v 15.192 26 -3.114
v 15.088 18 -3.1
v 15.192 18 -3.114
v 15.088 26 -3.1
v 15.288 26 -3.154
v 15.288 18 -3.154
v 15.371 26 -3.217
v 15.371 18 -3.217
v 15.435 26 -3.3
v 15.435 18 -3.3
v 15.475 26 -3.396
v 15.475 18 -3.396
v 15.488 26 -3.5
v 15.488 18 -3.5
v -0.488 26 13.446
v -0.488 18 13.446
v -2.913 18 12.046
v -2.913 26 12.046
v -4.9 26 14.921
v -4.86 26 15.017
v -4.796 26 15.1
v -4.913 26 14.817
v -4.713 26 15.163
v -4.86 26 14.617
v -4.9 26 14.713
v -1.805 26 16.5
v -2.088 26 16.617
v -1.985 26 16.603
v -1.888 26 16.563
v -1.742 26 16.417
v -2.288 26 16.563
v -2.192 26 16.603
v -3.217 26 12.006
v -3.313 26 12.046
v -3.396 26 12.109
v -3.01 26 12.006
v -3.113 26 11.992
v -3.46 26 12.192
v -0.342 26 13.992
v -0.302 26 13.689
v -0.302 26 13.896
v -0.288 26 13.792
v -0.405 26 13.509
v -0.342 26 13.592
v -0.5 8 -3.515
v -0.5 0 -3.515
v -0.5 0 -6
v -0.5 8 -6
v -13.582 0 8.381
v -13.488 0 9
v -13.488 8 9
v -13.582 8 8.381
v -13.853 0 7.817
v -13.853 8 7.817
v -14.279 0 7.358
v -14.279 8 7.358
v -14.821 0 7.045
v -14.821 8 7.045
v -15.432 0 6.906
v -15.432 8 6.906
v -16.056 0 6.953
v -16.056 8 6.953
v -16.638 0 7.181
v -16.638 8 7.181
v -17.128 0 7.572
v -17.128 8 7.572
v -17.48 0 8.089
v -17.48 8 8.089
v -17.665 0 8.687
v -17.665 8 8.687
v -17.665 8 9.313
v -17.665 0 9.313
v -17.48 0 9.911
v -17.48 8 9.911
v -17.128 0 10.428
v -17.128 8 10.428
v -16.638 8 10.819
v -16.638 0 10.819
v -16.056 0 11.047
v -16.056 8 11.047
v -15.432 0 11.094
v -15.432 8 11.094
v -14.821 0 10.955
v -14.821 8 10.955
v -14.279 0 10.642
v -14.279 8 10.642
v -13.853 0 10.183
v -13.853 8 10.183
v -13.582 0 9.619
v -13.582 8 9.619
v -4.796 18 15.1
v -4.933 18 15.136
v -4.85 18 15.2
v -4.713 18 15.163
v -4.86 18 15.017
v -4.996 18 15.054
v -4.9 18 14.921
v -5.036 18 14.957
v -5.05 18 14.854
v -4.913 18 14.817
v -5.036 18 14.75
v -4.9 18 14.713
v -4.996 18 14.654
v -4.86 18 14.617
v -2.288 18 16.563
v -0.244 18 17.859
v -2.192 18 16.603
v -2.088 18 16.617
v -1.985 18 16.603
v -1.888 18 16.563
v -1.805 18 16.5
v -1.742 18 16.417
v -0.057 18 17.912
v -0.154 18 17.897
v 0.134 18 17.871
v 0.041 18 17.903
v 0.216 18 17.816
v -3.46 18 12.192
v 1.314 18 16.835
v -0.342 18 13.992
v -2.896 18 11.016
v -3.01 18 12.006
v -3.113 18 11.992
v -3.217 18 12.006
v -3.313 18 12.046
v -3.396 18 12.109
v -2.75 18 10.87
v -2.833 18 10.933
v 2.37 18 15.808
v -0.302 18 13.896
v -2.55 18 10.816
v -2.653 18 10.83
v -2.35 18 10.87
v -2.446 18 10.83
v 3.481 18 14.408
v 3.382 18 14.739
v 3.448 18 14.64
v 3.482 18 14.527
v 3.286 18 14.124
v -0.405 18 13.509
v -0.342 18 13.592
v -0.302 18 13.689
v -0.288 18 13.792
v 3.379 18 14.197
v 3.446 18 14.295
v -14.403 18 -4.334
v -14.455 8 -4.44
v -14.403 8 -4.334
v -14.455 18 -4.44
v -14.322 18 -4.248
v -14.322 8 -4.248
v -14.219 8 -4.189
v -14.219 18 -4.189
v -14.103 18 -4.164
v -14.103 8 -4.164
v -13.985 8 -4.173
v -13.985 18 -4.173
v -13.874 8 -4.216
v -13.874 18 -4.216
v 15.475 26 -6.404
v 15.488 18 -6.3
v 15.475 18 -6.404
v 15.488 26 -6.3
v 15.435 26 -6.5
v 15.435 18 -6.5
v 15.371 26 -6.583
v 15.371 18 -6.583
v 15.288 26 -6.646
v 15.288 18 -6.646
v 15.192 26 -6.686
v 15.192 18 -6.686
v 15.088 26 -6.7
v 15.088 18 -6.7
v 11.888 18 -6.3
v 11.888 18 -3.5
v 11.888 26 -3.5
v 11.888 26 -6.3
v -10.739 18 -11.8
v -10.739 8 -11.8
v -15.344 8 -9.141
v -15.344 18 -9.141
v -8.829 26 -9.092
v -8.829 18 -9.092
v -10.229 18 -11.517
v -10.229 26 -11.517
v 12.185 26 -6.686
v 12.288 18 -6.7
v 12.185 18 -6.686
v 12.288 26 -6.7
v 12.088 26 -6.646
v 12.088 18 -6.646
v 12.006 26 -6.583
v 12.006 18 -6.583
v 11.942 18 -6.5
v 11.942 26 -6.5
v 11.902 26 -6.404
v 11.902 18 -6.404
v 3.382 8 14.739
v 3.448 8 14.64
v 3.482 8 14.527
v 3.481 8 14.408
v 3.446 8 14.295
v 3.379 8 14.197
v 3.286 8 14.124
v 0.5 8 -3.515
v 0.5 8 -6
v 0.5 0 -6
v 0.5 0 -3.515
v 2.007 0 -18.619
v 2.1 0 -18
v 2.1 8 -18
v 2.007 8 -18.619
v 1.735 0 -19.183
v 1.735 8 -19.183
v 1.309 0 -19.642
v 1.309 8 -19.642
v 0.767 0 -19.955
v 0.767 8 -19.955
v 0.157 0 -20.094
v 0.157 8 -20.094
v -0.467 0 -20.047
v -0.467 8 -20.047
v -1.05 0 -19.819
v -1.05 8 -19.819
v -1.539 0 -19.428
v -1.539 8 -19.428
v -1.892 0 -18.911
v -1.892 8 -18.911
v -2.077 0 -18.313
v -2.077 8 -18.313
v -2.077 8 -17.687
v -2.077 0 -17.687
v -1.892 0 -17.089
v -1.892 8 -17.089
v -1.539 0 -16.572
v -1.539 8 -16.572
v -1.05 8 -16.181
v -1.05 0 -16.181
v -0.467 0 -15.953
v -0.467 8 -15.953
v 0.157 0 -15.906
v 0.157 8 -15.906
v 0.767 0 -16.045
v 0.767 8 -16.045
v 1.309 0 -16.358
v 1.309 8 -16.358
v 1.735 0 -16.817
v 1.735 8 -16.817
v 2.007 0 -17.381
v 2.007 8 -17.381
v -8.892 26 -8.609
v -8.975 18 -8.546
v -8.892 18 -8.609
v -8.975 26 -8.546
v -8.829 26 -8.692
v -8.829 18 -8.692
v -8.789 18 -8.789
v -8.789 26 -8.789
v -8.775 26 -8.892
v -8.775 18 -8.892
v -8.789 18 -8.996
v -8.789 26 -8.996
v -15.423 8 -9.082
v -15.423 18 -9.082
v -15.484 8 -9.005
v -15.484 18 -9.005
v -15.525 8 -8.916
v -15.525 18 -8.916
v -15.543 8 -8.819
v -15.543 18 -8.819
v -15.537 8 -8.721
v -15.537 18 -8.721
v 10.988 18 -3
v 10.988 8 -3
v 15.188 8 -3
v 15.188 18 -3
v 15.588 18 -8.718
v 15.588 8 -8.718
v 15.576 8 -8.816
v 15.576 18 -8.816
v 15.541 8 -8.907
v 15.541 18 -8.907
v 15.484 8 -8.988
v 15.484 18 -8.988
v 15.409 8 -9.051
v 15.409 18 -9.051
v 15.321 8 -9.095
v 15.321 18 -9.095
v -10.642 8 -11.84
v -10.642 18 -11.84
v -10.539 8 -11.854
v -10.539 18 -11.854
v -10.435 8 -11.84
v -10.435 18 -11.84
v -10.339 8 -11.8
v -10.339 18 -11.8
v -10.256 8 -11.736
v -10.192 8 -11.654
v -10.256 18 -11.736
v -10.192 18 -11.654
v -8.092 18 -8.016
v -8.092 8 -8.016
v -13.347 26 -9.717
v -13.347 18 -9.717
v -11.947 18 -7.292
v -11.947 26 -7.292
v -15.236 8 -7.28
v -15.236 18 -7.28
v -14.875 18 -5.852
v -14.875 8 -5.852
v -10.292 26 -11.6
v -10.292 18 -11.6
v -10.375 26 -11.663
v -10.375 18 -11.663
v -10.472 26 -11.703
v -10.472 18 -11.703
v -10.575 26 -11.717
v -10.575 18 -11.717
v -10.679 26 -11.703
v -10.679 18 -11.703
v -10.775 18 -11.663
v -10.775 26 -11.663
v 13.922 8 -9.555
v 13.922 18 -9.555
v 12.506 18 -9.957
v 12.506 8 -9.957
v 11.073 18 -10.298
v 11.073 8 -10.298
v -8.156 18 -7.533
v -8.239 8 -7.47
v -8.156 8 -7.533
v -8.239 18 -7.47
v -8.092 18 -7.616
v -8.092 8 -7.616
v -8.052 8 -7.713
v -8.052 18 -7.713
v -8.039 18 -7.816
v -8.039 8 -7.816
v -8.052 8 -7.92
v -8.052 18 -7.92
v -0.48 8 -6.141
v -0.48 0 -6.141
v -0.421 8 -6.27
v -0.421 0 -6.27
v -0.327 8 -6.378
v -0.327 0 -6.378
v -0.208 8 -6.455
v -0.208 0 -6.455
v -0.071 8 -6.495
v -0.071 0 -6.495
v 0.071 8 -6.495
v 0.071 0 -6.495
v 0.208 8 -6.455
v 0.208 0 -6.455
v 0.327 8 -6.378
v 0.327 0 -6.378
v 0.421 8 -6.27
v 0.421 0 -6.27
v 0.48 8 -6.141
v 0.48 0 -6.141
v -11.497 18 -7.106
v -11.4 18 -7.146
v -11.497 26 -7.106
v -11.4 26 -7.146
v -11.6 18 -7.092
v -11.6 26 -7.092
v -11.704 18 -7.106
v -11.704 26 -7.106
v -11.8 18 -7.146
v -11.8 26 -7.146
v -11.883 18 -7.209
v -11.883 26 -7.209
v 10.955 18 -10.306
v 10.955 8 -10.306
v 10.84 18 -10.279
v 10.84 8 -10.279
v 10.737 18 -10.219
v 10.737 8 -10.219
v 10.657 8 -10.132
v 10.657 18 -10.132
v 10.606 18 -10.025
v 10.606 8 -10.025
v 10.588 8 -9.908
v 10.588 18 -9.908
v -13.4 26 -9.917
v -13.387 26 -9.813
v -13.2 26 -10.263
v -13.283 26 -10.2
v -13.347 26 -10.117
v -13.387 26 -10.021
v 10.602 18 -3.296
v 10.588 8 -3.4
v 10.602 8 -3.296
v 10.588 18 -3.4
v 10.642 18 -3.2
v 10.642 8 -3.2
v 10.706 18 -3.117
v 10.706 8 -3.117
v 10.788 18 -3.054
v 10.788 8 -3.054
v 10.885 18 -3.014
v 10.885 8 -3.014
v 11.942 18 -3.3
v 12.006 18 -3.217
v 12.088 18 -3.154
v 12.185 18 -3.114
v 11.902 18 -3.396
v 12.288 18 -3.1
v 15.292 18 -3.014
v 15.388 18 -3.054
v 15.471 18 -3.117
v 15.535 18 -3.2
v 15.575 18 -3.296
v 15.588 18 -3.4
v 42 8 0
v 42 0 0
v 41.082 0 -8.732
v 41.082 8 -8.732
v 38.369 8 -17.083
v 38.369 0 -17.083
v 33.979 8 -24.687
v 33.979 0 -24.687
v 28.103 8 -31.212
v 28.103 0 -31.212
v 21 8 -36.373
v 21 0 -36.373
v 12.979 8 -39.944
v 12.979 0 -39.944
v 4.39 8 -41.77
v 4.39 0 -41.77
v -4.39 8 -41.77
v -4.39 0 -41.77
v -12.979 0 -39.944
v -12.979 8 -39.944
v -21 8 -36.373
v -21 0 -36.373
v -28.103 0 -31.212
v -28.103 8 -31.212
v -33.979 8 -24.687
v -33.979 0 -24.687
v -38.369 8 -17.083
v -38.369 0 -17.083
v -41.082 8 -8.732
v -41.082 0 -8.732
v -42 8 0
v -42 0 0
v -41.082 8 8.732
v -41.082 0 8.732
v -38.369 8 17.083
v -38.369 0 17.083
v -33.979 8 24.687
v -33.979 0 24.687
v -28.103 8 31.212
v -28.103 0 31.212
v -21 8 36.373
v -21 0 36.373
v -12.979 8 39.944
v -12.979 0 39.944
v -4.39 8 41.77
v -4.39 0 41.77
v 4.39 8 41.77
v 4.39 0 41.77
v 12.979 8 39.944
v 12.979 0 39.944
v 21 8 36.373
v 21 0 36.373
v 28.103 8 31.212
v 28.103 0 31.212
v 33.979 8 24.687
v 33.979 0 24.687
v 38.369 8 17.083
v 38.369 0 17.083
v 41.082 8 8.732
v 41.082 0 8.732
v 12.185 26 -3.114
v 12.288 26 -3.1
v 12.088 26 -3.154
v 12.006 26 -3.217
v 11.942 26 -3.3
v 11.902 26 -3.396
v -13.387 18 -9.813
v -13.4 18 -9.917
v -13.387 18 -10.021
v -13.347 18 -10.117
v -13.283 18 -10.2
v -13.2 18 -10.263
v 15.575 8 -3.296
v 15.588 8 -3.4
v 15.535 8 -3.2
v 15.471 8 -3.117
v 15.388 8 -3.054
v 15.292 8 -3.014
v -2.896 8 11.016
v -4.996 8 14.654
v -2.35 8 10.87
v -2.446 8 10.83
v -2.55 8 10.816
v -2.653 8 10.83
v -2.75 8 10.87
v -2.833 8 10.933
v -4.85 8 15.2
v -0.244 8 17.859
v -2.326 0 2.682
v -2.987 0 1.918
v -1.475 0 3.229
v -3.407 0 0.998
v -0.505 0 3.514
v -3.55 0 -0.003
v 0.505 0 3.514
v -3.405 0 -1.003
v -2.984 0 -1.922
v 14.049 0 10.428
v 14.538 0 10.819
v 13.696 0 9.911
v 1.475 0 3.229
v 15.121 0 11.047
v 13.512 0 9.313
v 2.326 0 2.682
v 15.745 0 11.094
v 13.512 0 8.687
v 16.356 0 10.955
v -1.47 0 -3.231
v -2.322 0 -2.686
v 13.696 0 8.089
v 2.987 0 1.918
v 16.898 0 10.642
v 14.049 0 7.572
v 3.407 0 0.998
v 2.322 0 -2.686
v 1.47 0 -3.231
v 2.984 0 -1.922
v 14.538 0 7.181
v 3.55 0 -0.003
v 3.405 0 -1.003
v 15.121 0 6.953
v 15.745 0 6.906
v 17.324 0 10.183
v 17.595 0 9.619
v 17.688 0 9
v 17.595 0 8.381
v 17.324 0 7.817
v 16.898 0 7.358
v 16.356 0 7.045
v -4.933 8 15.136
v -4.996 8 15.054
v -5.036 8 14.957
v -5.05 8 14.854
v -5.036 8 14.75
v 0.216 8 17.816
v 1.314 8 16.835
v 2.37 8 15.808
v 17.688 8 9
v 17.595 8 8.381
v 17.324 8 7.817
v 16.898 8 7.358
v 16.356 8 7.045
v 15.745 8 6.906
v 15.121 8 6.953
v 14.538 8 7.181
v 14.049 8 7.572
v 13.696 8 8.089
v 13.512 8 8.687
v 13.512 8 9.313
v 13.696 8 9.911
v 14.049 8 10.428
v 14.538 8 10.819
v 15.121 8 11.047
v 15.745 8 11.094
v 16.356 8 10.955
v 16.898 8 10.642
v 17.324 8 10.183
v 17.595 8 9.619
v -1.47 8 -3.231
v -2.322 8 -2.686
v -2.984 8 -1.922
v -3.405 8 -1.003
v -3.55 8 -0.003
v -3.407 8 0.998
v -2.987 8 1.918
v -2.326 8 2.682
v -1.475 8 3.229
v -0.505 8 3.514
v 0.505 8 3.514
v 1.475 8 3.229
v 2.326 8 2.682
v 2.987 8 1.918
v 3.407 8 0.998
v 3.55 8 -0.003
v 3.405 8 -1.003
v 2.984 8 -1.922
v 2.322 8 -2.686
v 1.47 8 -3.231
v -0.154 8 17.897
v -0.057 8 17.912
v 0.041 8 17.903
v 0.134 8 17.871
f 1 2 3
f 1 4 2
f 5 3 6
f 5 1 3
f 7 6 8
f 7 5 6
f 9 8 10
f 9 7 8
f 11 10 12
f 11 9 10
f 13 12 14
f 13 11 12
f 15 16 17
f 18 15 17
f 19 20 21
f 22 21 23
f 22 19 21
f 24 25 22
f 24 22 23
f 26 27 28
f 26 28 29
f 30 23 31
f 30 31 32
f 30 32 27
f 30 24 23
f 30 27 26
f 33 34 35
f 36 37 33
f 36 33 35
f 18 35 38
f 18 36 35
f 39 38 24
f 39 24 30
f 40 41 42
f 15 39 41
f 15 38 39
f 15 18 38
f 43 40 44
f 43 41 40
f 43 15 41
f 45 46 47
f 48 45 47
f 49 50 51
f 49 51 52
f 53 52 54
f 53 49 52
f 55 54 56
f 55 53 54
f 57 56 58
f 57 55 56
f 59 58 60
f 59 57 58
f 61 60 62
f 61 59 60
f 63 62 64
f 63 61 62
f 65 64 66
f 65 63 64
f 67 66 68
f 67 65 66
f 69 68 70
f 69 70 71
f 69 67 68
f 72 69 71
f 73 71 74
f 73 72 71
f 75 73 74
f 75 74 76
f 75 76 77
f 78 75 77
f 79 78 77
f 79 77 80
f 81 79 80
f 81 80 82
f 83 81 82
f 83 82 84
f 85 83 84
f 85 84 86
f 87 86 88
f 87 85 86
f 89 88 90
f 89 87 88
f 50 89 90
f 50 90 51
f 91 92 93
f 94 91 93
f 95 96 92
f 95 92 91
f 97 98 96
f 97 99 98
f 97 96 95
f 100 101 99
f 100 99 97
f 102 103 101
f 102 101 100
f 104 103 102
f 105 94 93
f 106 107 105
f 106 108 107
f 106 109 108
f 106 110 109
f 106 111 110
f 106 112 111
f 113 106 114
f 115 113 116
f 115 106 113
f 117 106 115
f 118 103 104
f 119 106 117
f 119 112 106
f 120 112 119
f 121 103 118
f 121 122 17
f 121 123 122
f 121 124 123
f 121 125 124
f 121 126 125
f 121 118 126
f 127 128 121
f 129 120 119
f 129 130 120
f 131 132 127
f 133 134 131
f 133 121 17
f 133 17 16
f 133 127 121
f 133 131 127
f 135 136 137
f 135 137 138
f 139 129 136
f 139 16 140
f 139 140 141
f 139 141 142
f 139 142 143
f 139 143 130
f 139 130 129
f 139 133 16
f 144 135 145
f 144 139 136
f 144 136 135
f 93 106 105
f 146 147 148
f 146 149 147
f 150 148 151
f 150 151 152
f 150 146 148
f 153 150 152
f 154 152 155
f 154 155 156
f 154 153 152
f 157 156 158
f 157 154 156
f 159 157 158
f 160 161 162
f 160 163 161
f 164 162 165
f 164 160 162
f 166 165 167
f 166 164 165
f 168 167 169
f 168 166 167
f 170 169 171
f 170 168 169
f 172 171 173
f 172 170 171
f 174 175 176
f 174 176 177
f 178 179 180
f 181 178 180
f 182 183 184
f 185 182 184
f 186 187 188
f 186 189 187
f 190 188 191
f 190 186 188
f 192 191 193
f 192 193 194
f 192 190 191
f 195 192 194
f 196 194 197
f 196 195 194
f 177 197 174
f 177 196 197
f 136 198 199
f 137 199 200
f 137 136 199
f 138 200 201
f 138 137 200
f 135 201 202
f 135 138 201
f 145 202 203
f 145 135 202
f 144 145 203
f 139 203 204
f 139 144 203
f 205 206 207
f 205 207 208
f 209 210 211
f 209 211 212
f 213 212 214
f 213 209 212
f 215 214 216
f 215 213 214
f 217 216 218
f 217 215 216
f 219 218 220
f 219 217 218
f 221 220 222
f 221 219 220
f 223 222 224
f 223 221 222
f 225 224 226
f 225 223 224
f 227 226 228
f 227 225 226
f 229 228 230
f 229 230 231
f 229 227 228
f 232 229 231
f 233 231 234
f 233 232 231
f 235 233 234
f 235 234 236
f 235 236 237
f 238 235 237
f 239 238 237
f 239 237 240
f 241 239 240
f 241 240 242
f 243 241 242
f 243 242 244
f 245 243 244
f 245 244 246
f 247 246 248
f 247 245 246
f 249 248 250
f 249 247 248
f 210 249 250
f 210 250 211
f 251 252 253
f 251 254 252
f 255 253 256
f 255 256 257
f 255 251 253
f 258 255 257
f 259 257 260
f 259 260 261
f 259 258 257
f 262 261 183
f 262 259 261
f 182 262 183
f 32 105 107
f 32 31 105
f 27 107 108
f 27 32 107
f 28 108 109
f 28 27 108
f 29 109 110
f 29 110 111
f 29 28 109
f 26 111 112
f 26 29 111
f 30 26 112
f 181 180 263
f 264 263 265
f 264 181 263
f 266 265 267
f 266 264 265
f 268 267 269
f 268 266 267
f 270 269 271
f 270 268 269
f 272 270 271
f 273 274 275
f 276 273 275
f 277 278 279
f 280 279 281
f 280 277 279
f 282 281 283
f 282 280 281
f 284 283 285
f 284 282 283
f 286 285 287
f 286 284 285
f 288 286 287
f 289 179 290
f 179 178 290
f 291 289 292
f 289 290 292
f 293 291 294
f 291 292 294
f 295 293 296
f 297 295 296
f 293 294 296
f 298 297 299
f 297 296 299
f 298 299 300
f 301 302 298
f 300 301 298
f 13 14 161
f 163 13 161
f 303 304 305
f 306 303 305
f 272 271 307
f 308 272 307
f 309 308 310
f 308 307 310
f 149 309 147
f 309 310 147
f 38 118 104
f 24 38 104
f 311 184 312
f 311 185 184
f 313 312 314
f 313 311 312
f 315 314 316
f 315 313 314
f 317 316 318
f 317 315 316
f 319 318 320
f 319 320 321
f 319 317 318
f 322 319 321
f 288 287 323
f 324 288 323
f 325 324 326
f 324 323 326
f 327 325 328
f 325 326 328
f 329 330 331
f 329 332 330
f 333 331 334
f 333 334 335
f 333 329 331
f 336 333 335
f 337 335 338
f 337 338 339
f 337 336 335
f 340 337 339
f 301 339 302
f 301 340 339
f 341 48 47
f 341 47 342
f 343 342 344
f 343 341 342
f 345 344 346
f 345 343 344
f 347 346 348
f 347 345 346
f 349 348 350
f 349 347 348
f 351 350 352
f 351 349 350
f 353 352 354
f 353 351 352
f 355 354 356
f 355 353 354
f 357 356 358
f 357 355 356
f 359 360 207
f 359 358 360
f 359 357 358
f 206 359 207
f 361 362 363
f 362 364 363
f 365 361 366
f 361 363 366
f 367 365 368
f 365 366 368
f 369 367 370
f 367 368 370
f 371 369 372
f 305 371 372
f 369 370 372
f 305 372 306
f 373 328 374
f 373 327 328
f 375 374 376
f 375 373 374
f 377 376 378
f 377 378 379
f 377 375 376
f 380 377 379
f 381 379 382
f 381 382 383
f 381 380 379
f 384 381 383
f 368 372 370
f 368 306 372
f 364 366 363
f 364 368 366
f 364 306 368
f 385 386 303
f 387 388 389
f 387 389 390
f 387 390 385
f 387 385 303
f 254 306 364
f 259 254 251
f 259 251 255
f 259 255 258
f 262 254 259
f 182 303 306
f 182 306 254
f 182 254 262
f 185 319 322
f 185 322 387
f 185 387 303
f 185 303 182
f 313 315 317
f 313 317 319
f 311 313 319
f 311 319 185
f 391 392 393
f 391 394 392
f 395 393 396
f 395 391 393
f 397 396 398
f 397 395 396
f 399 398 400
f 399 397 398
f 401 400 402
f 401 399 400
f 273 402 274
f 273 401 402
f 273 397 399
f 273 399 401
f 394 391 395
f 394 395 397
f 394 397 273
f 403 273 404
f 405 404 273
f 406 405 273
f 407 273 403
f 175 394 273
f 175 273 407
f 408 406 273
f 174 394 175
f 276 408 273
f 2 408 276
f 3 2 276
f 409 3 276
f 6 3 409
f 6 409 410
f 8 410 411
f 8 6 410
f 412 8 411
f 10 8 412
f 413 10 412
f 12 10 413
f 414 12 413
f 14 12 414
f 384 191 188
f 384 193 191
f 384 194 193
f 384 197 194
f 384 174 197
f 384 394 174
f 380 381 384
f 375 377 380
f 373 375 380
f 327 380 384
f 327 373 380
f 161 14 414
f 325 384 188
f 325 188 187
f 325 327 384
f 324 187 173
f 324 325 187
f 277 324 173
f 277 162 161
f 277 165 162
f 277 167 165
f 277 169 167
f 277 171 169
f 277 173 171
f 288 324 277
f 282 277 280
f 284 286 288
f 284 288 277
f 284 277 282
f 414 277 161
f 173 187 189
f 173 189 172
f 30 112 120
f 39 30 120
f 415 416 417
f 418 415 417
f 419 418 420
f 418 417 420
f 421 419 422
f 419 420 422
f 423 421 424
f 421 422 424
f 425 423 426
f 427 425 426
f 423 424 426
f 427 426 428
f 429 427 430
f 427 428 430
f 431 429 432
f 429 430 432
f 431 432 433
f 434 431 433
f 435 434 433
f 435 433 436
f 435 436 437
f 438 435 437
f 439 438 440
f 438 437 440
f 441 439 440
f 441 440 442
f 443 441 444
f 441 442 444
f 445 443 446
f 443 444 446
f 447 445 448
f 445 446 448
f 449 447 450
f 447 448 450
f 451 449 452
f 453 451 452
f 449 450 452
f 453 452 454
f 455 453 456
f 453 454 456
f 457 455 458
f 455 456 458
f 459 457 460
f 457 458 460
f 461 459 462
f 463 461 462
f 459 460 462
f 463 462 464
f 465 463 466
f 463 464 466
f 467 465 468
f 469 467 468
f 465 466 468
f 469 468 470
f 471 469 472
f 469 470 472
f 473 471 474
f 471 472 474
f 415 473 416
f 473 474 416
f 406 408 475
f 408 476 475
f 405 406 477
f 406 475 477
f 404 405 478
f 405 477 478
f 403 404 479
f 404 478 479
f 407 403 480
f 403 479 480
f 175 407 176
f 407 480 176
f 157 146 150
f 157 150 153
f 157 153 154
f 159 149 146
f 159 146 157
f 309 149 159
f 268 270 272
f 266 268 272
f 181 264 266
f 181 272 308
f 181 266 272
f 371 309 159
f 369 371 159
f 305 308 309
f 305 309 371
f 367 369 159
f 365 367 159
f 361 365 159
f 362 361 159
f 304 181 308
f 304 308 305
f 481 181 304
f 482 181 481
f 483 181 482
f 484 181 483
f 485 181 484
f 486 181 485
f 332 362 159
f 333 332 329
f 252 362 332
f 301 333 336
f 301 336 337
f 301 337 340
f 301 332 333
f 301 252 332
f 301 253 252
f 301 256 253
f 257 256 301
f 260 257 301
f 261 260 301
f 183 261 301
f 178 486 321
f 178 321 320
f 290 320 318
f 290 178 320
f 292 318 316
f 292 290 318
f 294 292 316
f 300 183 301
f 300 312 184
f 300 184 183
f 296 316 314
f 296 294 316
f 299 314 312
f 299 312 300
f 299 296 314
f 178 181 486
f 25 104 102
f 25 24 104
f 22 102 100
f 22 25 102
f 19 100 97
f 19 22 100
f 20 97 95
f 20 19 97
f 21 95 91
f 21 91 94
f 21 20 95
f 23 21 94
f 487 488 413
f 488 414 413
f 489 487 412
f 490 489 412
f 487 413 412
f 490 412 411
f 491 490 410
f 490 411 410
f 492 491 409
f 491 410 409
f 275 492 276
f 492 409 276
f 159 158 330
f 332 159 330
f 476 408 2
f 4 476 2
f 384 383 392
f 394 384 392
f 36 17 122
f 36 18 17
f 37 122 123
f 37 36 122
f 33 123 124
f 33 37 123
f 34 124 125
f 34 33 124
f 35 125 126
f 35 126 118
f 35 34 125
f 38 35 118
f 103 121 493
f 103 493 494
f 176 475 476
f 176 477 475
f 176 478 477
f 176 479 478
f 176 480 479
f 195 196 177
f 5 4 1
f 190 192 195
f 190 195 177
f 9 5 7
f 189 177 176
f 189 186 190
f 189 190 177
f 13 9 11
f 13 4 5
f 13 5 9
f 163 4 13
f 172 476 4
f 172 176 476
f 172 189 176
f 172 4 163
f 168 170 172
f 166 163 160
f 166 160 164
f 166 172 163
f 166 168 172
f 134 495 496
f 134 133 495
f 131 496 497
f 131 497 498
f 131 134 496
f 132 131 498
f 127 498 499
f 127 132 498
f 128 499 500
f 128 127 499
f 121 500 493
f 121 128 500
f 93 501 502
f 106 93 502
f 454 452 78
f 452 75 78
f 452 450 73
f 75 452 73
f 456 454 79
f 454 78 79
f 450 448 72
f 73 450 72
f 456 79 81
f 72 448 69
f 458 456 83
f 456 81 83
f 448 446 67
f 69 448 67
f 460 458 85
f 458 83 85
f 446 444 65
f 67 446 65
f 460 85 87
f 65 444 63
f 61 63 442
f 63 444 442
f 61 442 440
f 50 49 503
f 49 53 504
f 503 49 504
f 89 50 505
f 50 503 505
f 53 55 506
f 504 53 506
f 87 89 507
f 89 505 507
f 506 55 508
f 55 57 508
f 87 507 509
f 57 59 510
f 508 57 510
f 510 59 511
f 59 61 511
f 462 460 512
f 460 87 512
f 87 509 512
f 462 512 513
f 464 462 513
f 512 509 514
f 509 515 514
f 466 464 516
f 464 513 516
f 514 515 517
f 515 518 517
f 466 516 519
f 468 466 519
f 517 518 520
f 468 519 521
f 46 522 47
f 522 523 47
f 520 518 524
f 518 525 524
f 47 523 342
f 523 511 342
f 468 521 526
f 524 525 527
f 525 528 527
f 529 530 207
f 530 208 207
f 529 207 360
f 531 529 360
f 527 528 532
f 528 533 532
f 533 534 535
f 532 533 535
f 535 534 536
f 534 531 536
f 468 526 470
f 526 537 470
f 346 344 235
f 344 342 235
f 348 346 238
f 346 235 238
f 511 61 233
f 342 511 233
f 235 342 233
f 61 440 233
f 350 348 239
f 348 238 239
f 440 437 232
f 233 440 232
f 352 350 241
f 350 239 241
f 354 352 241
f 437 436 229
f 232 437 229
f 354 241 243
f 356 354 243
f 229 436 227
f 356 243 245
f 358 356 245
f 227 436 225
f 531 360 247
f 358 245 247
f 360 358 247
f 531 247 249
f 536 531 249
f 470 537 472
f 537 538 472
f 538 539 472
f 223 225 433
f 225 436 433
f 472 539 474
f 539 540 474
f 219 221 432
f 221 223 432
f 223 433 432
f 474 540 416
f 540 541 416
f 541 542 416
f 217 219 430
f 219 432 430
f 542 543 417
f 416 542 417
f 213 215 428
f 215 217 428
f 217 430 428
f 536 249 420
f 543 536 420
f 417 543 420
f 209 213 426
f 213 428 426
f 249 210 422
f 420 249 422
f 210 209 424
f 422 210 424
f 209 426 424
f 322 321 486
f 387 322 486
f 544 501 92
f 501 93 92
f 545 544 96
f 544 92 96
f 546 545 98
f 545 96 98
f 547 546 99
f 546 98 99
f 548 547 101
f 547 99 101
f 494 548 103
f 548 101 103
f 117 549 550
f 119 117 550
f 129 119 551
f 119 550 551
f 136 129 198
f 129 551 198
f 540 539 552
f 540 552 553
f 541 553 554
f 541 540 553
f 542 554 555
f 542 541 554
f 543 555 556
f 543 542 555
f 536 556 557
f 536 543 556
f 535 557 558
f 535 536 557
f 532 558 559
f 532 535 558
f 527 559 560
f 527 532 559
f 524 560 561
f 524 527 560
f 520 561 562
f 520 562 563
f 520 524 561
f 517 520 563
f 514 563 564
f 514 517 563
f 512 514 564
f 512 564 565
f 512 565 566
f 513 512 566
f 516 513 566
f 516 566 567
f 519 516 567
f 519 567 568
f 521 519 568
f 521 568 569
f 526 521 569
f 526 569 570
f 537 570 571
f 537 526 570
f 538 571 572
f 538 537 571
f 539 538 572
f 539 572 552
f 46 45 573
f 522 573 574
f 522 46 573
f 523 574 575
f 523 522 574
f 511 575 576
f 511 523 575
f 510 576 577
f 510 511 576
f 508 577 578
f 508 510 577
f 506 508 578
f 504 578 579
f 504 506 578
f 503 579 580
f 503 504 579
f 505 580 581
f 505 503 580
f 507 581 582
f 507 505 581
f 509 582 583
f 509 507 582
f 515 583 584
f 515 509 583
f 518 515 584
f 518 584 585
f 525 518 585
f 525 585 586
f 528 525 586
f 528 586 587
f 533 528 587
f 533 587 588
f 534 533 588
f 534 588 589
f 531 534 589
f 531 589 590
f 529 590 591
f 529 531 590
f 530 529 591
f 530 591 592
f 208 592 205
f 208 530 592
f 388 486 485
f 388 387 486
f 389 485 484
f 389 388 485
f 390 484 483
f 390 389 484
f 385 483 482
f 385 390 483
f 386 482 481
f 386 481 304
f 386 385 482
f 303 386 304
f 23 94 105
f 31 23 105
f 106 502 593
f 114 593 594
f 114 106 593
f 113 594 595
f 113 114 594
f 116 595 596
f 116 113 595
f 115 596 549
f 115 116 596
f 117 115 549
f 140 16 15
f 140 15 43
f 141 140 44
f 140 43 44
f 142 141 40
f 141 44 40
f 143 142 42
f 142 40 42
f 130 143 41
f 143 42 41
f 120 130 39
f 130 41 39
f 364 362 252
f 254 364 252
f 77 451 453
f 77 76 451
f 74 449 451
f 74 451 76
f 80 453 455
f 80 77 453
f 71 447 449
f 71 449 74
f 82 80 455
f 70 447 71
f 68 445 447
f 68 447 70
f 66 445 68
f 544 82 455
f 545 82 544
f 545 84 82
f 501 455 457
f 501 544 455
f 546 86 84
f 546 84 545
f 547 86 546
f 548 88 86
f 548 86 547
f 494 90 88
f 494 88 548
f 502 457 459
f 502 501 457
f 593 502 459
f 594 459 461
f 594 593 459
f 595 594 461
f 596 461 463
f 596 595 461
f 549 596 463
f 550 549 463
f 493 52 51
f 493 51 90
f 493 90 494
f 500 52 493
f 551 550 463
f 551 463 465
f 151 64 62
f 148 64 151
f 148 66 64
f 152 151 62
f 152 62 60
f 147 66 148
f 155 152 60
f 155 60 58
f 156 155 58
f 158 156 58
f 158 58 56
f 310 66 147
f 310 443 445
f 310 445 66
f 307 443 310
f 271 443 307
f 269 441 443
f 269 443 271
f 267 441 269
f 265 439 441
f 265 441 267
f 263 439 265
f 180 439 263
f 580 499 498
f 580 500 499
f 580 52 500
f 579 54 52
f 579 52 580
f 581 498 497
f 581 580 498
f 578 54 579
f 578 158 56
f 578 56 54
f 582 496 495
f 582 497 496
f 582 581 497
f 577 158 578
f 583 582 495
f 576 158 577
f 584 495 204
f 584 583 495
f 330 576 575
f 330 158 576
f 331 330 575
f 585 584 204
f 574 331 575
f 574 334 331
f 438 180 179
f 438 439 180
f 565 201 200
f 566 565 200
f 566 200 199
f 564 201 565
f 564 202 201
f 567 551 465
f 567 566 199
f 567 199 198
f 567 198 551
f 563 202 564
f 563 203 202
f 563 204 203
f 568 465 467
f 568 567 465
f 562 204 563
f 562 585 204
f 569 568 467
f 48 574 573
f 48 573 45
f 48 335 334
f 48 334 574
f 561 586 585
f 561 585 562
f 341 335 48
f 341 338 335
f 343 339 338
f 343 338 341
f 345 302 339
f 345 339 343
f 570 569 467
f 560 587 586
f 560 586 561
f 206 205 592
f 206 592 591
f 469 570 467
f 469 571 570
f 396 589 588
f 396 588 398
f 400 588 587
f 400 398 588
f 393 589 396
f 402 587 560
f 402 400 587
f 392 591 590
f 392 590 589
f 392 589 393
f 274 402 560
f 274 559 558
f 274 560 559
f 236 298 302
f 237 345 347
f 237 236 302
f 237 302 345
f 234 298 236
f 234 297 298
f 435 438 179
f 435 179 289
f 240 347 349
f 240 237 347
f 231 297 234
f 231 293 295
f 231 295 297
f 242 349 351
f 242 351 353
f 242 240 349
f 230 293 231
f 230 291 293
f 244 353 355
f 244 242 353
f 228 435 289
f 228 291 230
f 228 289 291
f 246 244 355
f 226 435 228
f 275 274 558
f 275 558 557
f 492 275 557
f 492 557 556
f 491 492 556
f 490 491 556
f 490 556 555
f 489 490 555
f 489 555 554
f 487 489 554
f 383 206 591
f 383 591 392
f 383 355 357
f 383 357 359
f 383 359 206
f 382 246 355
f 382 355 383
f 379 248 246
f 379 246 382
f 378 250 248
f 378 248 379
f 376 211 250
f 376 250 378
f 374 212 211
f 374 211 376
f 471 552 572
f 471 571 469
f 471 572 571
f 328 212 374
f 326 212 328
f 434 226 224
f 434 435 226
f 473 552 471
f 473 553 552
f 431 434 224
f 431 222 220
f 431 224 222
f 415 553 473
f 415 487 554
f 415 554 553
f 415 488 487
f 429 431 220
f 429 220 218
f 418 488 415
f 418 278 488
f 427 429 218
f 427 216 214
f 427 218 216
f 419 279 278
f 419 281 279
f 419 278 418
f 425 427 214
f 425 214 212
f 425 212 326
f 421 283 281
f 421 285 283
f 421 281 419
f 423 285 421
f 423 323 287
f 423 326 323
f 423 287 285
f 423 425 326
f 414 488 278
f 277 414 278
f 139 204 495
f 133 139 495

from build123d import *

# Parameters (mm, degrees)
BOSS_EXTRUDE1_OUTLINE_R   = 42
BOSS_EXTRUDE1_OUTLINE_R_2 = 2.1
BOSS_EXTRUDE1_OUTLINE_R_3 = 3.55
BOSS_EXTRUDE1_DEPTH       = 8
CUT_EXTRUDE2_DEPTH        = 10
BOSS_EXTRUDE5_DEPTH       = 10
SKETCH9_W                 = 3.6
SKETCH9_H                 = 3.6
BOSS_EXTRUDE6_DEPTH       = 8
FILLET1_R                 = 0.4


# Read off the part's stored shape, not the designer's step: Boss-Extrude1
with BuildPart() as part:
    # Boss-Extrude1 outline → Boss-Extrude1 (new body)
    with BuildSketch(Plane(origin=(0, 0, 0), x_dir=(1, 0, 0), z_dir=(0, 1, 0))):
        Circle(BOSS_EXTRUDE1_OUTLINE_R)
        with Locations((-15.588457268, -9)):
            Circle(BOSS_EXTRUDE1_OUTLINE_R_2, mode=Mode.SUBTRACT)
        with Locations((15.588457268, -9)):
            Circle(BOSS_EXTRUDE1_OUTLINE_R_2, mode=Mode.SUBTRACT)
        Circle(BOSS_EXTRUDE1_OUTLINE_R_3, mode=Mode.SUBTRACT)
        with Locations((0, 18)):
            Circle(BOSS_EXTRUDE1_OUTLINE_R_2, mode=Mode.SUBTRACT)
    extrude(amount=BOSS_EXTRUDE1_DEPTH)

    # Sketch3 → Cut-Extrude2 (cut)
    with BuildSketch(Plane(origin=(0, 8, 0), x_dir=(1, 0, 0), z_dir=(0, 1, 0))):
        with BuildLine():
            Line((0.5, 6), (0.5, 0))
            ThreePointArc((0.5, 0), (0, -0.5), (-0.5, 0))
            Line((-0.5, 0), (-0.5, 6))
            ThreePointArc((-0.5, 6), (0, 6.5), (0.5, 6))
        make_face()
    extrude(amount=-CUT_EXTRUDE2_DEPTH, mode=Mode.SUBTRACT)

    # Sketch7 → Boss-Extrude5 (add)
    with BuildSketch(Plane(origin=(0, 8, 0), x_dir=(1, 0, 0), z_dir=(0, 1, 0))):
        with BuildLine():
            Line((-5.196152423, -15), (0, -18))
            ThreePointArc((0, -18), (1.923015451, -16.253248712), (3.712435565, -14.369872981))
            Line((3.712435565, -14.369872981), (-2.696152423, -10.669872981))
            Line((-2.696152423, -10.669872981), (-5.196152423, -15))
        make_face()
        with BuildLine():
            Line((-10.392304845, 12), (-15.588457268, 9))
            ThreePointArc((-15.588457268, 9), (-15.037234004, 6.461244123), (-14.300892833, 3.969872981))
            Line((-14.300892833, 3.969872981), (-7.892304845, 7.669872981))
            Line((-7.892304845, 7.669872981), (-10.392304845, 12))
        make_face()
        with BuildLine():
            Line((15.588457268, 3), (15.588457268, 9))
            ThreePointArc((15.588457268, 9), (13.114218553, 9.792004588), (10.588457268, 10.4))
            Line((10.588457268, 10.4), (10.588457268, 3))
            Line((10.588457268, 3), (15.588457268, 3))
        make_face()
    extrude(amount=BOSS_EXTRUDE5_DEPTH)

    # Sketch9 → Boss-Extrude6 (add)
    with BuildSketch(Plane(origin=(0, 18, 0), x_dir=(1, 0, 0), z_dir=(0, 1, 0))):
        with Locations((13.688457268, 4.9)):
            Rectangle(SKETCH9_W, SKETCH9_H)
        Polygon((-0.141858429, -13.645706006), (-3.259549882, -11.845706006), (-5.059549882, -14.96339746), (-1.941858429, -16.76339746), align=None)
        Polygon((-11.746598839, 6.945706006), (-8.628907386, 8.745706006), (-10.428907386, 11.86339746), (-13.546598839, 10.06339746), align=None)
    extrude(amount=BOSS_EXTRUDE6_DEPTH)

    # Fillet1
    fillet1_edges = [part.edges().sort_by_distance(p)[0] for p in [
        (-13.546598839, 22, -10.06339746),
        (-11.746598839, 22, -6.945706006),
        (-8.628907386, 22, -8.745706006),
        (-10.428907386, 22, -11.86339746),
        (-7.892304845, 13, -7.669872981),
        (-10.392304845, 13, -12),
        (-15.588457268, 13, -9),
        (-14.300892833, 13, -3.969872981),
        (-2.696152423, 13, 10.669872981),
        (-5.196152423, 13, 15),
        (0, 13, 18),
        (3.712435565, 13, 14.369872981),
        (10.588457268, 13, -3),
        (15.588457268, 13, -3),
        (15.588457268, 13, -9),
        (10.588457268, 13, -10.4),
        (15.488457268, 22, -6.7),
        (11.888457268, 22, -6.7),
        (11.888457268, 22, -3.1),
        (15.488457268, 22, -3.1),
        (-1.941858429, 22, 16.76339746),
        (-0.141858429, 22, 13.645706006),
        (-3.259549882, 22, 11.845706006),
        (-5.059549882, 22, 14.96339746),
    ]]
    fillet(fillet1_edges, radius=FILLET1_R)


solid = part.part
